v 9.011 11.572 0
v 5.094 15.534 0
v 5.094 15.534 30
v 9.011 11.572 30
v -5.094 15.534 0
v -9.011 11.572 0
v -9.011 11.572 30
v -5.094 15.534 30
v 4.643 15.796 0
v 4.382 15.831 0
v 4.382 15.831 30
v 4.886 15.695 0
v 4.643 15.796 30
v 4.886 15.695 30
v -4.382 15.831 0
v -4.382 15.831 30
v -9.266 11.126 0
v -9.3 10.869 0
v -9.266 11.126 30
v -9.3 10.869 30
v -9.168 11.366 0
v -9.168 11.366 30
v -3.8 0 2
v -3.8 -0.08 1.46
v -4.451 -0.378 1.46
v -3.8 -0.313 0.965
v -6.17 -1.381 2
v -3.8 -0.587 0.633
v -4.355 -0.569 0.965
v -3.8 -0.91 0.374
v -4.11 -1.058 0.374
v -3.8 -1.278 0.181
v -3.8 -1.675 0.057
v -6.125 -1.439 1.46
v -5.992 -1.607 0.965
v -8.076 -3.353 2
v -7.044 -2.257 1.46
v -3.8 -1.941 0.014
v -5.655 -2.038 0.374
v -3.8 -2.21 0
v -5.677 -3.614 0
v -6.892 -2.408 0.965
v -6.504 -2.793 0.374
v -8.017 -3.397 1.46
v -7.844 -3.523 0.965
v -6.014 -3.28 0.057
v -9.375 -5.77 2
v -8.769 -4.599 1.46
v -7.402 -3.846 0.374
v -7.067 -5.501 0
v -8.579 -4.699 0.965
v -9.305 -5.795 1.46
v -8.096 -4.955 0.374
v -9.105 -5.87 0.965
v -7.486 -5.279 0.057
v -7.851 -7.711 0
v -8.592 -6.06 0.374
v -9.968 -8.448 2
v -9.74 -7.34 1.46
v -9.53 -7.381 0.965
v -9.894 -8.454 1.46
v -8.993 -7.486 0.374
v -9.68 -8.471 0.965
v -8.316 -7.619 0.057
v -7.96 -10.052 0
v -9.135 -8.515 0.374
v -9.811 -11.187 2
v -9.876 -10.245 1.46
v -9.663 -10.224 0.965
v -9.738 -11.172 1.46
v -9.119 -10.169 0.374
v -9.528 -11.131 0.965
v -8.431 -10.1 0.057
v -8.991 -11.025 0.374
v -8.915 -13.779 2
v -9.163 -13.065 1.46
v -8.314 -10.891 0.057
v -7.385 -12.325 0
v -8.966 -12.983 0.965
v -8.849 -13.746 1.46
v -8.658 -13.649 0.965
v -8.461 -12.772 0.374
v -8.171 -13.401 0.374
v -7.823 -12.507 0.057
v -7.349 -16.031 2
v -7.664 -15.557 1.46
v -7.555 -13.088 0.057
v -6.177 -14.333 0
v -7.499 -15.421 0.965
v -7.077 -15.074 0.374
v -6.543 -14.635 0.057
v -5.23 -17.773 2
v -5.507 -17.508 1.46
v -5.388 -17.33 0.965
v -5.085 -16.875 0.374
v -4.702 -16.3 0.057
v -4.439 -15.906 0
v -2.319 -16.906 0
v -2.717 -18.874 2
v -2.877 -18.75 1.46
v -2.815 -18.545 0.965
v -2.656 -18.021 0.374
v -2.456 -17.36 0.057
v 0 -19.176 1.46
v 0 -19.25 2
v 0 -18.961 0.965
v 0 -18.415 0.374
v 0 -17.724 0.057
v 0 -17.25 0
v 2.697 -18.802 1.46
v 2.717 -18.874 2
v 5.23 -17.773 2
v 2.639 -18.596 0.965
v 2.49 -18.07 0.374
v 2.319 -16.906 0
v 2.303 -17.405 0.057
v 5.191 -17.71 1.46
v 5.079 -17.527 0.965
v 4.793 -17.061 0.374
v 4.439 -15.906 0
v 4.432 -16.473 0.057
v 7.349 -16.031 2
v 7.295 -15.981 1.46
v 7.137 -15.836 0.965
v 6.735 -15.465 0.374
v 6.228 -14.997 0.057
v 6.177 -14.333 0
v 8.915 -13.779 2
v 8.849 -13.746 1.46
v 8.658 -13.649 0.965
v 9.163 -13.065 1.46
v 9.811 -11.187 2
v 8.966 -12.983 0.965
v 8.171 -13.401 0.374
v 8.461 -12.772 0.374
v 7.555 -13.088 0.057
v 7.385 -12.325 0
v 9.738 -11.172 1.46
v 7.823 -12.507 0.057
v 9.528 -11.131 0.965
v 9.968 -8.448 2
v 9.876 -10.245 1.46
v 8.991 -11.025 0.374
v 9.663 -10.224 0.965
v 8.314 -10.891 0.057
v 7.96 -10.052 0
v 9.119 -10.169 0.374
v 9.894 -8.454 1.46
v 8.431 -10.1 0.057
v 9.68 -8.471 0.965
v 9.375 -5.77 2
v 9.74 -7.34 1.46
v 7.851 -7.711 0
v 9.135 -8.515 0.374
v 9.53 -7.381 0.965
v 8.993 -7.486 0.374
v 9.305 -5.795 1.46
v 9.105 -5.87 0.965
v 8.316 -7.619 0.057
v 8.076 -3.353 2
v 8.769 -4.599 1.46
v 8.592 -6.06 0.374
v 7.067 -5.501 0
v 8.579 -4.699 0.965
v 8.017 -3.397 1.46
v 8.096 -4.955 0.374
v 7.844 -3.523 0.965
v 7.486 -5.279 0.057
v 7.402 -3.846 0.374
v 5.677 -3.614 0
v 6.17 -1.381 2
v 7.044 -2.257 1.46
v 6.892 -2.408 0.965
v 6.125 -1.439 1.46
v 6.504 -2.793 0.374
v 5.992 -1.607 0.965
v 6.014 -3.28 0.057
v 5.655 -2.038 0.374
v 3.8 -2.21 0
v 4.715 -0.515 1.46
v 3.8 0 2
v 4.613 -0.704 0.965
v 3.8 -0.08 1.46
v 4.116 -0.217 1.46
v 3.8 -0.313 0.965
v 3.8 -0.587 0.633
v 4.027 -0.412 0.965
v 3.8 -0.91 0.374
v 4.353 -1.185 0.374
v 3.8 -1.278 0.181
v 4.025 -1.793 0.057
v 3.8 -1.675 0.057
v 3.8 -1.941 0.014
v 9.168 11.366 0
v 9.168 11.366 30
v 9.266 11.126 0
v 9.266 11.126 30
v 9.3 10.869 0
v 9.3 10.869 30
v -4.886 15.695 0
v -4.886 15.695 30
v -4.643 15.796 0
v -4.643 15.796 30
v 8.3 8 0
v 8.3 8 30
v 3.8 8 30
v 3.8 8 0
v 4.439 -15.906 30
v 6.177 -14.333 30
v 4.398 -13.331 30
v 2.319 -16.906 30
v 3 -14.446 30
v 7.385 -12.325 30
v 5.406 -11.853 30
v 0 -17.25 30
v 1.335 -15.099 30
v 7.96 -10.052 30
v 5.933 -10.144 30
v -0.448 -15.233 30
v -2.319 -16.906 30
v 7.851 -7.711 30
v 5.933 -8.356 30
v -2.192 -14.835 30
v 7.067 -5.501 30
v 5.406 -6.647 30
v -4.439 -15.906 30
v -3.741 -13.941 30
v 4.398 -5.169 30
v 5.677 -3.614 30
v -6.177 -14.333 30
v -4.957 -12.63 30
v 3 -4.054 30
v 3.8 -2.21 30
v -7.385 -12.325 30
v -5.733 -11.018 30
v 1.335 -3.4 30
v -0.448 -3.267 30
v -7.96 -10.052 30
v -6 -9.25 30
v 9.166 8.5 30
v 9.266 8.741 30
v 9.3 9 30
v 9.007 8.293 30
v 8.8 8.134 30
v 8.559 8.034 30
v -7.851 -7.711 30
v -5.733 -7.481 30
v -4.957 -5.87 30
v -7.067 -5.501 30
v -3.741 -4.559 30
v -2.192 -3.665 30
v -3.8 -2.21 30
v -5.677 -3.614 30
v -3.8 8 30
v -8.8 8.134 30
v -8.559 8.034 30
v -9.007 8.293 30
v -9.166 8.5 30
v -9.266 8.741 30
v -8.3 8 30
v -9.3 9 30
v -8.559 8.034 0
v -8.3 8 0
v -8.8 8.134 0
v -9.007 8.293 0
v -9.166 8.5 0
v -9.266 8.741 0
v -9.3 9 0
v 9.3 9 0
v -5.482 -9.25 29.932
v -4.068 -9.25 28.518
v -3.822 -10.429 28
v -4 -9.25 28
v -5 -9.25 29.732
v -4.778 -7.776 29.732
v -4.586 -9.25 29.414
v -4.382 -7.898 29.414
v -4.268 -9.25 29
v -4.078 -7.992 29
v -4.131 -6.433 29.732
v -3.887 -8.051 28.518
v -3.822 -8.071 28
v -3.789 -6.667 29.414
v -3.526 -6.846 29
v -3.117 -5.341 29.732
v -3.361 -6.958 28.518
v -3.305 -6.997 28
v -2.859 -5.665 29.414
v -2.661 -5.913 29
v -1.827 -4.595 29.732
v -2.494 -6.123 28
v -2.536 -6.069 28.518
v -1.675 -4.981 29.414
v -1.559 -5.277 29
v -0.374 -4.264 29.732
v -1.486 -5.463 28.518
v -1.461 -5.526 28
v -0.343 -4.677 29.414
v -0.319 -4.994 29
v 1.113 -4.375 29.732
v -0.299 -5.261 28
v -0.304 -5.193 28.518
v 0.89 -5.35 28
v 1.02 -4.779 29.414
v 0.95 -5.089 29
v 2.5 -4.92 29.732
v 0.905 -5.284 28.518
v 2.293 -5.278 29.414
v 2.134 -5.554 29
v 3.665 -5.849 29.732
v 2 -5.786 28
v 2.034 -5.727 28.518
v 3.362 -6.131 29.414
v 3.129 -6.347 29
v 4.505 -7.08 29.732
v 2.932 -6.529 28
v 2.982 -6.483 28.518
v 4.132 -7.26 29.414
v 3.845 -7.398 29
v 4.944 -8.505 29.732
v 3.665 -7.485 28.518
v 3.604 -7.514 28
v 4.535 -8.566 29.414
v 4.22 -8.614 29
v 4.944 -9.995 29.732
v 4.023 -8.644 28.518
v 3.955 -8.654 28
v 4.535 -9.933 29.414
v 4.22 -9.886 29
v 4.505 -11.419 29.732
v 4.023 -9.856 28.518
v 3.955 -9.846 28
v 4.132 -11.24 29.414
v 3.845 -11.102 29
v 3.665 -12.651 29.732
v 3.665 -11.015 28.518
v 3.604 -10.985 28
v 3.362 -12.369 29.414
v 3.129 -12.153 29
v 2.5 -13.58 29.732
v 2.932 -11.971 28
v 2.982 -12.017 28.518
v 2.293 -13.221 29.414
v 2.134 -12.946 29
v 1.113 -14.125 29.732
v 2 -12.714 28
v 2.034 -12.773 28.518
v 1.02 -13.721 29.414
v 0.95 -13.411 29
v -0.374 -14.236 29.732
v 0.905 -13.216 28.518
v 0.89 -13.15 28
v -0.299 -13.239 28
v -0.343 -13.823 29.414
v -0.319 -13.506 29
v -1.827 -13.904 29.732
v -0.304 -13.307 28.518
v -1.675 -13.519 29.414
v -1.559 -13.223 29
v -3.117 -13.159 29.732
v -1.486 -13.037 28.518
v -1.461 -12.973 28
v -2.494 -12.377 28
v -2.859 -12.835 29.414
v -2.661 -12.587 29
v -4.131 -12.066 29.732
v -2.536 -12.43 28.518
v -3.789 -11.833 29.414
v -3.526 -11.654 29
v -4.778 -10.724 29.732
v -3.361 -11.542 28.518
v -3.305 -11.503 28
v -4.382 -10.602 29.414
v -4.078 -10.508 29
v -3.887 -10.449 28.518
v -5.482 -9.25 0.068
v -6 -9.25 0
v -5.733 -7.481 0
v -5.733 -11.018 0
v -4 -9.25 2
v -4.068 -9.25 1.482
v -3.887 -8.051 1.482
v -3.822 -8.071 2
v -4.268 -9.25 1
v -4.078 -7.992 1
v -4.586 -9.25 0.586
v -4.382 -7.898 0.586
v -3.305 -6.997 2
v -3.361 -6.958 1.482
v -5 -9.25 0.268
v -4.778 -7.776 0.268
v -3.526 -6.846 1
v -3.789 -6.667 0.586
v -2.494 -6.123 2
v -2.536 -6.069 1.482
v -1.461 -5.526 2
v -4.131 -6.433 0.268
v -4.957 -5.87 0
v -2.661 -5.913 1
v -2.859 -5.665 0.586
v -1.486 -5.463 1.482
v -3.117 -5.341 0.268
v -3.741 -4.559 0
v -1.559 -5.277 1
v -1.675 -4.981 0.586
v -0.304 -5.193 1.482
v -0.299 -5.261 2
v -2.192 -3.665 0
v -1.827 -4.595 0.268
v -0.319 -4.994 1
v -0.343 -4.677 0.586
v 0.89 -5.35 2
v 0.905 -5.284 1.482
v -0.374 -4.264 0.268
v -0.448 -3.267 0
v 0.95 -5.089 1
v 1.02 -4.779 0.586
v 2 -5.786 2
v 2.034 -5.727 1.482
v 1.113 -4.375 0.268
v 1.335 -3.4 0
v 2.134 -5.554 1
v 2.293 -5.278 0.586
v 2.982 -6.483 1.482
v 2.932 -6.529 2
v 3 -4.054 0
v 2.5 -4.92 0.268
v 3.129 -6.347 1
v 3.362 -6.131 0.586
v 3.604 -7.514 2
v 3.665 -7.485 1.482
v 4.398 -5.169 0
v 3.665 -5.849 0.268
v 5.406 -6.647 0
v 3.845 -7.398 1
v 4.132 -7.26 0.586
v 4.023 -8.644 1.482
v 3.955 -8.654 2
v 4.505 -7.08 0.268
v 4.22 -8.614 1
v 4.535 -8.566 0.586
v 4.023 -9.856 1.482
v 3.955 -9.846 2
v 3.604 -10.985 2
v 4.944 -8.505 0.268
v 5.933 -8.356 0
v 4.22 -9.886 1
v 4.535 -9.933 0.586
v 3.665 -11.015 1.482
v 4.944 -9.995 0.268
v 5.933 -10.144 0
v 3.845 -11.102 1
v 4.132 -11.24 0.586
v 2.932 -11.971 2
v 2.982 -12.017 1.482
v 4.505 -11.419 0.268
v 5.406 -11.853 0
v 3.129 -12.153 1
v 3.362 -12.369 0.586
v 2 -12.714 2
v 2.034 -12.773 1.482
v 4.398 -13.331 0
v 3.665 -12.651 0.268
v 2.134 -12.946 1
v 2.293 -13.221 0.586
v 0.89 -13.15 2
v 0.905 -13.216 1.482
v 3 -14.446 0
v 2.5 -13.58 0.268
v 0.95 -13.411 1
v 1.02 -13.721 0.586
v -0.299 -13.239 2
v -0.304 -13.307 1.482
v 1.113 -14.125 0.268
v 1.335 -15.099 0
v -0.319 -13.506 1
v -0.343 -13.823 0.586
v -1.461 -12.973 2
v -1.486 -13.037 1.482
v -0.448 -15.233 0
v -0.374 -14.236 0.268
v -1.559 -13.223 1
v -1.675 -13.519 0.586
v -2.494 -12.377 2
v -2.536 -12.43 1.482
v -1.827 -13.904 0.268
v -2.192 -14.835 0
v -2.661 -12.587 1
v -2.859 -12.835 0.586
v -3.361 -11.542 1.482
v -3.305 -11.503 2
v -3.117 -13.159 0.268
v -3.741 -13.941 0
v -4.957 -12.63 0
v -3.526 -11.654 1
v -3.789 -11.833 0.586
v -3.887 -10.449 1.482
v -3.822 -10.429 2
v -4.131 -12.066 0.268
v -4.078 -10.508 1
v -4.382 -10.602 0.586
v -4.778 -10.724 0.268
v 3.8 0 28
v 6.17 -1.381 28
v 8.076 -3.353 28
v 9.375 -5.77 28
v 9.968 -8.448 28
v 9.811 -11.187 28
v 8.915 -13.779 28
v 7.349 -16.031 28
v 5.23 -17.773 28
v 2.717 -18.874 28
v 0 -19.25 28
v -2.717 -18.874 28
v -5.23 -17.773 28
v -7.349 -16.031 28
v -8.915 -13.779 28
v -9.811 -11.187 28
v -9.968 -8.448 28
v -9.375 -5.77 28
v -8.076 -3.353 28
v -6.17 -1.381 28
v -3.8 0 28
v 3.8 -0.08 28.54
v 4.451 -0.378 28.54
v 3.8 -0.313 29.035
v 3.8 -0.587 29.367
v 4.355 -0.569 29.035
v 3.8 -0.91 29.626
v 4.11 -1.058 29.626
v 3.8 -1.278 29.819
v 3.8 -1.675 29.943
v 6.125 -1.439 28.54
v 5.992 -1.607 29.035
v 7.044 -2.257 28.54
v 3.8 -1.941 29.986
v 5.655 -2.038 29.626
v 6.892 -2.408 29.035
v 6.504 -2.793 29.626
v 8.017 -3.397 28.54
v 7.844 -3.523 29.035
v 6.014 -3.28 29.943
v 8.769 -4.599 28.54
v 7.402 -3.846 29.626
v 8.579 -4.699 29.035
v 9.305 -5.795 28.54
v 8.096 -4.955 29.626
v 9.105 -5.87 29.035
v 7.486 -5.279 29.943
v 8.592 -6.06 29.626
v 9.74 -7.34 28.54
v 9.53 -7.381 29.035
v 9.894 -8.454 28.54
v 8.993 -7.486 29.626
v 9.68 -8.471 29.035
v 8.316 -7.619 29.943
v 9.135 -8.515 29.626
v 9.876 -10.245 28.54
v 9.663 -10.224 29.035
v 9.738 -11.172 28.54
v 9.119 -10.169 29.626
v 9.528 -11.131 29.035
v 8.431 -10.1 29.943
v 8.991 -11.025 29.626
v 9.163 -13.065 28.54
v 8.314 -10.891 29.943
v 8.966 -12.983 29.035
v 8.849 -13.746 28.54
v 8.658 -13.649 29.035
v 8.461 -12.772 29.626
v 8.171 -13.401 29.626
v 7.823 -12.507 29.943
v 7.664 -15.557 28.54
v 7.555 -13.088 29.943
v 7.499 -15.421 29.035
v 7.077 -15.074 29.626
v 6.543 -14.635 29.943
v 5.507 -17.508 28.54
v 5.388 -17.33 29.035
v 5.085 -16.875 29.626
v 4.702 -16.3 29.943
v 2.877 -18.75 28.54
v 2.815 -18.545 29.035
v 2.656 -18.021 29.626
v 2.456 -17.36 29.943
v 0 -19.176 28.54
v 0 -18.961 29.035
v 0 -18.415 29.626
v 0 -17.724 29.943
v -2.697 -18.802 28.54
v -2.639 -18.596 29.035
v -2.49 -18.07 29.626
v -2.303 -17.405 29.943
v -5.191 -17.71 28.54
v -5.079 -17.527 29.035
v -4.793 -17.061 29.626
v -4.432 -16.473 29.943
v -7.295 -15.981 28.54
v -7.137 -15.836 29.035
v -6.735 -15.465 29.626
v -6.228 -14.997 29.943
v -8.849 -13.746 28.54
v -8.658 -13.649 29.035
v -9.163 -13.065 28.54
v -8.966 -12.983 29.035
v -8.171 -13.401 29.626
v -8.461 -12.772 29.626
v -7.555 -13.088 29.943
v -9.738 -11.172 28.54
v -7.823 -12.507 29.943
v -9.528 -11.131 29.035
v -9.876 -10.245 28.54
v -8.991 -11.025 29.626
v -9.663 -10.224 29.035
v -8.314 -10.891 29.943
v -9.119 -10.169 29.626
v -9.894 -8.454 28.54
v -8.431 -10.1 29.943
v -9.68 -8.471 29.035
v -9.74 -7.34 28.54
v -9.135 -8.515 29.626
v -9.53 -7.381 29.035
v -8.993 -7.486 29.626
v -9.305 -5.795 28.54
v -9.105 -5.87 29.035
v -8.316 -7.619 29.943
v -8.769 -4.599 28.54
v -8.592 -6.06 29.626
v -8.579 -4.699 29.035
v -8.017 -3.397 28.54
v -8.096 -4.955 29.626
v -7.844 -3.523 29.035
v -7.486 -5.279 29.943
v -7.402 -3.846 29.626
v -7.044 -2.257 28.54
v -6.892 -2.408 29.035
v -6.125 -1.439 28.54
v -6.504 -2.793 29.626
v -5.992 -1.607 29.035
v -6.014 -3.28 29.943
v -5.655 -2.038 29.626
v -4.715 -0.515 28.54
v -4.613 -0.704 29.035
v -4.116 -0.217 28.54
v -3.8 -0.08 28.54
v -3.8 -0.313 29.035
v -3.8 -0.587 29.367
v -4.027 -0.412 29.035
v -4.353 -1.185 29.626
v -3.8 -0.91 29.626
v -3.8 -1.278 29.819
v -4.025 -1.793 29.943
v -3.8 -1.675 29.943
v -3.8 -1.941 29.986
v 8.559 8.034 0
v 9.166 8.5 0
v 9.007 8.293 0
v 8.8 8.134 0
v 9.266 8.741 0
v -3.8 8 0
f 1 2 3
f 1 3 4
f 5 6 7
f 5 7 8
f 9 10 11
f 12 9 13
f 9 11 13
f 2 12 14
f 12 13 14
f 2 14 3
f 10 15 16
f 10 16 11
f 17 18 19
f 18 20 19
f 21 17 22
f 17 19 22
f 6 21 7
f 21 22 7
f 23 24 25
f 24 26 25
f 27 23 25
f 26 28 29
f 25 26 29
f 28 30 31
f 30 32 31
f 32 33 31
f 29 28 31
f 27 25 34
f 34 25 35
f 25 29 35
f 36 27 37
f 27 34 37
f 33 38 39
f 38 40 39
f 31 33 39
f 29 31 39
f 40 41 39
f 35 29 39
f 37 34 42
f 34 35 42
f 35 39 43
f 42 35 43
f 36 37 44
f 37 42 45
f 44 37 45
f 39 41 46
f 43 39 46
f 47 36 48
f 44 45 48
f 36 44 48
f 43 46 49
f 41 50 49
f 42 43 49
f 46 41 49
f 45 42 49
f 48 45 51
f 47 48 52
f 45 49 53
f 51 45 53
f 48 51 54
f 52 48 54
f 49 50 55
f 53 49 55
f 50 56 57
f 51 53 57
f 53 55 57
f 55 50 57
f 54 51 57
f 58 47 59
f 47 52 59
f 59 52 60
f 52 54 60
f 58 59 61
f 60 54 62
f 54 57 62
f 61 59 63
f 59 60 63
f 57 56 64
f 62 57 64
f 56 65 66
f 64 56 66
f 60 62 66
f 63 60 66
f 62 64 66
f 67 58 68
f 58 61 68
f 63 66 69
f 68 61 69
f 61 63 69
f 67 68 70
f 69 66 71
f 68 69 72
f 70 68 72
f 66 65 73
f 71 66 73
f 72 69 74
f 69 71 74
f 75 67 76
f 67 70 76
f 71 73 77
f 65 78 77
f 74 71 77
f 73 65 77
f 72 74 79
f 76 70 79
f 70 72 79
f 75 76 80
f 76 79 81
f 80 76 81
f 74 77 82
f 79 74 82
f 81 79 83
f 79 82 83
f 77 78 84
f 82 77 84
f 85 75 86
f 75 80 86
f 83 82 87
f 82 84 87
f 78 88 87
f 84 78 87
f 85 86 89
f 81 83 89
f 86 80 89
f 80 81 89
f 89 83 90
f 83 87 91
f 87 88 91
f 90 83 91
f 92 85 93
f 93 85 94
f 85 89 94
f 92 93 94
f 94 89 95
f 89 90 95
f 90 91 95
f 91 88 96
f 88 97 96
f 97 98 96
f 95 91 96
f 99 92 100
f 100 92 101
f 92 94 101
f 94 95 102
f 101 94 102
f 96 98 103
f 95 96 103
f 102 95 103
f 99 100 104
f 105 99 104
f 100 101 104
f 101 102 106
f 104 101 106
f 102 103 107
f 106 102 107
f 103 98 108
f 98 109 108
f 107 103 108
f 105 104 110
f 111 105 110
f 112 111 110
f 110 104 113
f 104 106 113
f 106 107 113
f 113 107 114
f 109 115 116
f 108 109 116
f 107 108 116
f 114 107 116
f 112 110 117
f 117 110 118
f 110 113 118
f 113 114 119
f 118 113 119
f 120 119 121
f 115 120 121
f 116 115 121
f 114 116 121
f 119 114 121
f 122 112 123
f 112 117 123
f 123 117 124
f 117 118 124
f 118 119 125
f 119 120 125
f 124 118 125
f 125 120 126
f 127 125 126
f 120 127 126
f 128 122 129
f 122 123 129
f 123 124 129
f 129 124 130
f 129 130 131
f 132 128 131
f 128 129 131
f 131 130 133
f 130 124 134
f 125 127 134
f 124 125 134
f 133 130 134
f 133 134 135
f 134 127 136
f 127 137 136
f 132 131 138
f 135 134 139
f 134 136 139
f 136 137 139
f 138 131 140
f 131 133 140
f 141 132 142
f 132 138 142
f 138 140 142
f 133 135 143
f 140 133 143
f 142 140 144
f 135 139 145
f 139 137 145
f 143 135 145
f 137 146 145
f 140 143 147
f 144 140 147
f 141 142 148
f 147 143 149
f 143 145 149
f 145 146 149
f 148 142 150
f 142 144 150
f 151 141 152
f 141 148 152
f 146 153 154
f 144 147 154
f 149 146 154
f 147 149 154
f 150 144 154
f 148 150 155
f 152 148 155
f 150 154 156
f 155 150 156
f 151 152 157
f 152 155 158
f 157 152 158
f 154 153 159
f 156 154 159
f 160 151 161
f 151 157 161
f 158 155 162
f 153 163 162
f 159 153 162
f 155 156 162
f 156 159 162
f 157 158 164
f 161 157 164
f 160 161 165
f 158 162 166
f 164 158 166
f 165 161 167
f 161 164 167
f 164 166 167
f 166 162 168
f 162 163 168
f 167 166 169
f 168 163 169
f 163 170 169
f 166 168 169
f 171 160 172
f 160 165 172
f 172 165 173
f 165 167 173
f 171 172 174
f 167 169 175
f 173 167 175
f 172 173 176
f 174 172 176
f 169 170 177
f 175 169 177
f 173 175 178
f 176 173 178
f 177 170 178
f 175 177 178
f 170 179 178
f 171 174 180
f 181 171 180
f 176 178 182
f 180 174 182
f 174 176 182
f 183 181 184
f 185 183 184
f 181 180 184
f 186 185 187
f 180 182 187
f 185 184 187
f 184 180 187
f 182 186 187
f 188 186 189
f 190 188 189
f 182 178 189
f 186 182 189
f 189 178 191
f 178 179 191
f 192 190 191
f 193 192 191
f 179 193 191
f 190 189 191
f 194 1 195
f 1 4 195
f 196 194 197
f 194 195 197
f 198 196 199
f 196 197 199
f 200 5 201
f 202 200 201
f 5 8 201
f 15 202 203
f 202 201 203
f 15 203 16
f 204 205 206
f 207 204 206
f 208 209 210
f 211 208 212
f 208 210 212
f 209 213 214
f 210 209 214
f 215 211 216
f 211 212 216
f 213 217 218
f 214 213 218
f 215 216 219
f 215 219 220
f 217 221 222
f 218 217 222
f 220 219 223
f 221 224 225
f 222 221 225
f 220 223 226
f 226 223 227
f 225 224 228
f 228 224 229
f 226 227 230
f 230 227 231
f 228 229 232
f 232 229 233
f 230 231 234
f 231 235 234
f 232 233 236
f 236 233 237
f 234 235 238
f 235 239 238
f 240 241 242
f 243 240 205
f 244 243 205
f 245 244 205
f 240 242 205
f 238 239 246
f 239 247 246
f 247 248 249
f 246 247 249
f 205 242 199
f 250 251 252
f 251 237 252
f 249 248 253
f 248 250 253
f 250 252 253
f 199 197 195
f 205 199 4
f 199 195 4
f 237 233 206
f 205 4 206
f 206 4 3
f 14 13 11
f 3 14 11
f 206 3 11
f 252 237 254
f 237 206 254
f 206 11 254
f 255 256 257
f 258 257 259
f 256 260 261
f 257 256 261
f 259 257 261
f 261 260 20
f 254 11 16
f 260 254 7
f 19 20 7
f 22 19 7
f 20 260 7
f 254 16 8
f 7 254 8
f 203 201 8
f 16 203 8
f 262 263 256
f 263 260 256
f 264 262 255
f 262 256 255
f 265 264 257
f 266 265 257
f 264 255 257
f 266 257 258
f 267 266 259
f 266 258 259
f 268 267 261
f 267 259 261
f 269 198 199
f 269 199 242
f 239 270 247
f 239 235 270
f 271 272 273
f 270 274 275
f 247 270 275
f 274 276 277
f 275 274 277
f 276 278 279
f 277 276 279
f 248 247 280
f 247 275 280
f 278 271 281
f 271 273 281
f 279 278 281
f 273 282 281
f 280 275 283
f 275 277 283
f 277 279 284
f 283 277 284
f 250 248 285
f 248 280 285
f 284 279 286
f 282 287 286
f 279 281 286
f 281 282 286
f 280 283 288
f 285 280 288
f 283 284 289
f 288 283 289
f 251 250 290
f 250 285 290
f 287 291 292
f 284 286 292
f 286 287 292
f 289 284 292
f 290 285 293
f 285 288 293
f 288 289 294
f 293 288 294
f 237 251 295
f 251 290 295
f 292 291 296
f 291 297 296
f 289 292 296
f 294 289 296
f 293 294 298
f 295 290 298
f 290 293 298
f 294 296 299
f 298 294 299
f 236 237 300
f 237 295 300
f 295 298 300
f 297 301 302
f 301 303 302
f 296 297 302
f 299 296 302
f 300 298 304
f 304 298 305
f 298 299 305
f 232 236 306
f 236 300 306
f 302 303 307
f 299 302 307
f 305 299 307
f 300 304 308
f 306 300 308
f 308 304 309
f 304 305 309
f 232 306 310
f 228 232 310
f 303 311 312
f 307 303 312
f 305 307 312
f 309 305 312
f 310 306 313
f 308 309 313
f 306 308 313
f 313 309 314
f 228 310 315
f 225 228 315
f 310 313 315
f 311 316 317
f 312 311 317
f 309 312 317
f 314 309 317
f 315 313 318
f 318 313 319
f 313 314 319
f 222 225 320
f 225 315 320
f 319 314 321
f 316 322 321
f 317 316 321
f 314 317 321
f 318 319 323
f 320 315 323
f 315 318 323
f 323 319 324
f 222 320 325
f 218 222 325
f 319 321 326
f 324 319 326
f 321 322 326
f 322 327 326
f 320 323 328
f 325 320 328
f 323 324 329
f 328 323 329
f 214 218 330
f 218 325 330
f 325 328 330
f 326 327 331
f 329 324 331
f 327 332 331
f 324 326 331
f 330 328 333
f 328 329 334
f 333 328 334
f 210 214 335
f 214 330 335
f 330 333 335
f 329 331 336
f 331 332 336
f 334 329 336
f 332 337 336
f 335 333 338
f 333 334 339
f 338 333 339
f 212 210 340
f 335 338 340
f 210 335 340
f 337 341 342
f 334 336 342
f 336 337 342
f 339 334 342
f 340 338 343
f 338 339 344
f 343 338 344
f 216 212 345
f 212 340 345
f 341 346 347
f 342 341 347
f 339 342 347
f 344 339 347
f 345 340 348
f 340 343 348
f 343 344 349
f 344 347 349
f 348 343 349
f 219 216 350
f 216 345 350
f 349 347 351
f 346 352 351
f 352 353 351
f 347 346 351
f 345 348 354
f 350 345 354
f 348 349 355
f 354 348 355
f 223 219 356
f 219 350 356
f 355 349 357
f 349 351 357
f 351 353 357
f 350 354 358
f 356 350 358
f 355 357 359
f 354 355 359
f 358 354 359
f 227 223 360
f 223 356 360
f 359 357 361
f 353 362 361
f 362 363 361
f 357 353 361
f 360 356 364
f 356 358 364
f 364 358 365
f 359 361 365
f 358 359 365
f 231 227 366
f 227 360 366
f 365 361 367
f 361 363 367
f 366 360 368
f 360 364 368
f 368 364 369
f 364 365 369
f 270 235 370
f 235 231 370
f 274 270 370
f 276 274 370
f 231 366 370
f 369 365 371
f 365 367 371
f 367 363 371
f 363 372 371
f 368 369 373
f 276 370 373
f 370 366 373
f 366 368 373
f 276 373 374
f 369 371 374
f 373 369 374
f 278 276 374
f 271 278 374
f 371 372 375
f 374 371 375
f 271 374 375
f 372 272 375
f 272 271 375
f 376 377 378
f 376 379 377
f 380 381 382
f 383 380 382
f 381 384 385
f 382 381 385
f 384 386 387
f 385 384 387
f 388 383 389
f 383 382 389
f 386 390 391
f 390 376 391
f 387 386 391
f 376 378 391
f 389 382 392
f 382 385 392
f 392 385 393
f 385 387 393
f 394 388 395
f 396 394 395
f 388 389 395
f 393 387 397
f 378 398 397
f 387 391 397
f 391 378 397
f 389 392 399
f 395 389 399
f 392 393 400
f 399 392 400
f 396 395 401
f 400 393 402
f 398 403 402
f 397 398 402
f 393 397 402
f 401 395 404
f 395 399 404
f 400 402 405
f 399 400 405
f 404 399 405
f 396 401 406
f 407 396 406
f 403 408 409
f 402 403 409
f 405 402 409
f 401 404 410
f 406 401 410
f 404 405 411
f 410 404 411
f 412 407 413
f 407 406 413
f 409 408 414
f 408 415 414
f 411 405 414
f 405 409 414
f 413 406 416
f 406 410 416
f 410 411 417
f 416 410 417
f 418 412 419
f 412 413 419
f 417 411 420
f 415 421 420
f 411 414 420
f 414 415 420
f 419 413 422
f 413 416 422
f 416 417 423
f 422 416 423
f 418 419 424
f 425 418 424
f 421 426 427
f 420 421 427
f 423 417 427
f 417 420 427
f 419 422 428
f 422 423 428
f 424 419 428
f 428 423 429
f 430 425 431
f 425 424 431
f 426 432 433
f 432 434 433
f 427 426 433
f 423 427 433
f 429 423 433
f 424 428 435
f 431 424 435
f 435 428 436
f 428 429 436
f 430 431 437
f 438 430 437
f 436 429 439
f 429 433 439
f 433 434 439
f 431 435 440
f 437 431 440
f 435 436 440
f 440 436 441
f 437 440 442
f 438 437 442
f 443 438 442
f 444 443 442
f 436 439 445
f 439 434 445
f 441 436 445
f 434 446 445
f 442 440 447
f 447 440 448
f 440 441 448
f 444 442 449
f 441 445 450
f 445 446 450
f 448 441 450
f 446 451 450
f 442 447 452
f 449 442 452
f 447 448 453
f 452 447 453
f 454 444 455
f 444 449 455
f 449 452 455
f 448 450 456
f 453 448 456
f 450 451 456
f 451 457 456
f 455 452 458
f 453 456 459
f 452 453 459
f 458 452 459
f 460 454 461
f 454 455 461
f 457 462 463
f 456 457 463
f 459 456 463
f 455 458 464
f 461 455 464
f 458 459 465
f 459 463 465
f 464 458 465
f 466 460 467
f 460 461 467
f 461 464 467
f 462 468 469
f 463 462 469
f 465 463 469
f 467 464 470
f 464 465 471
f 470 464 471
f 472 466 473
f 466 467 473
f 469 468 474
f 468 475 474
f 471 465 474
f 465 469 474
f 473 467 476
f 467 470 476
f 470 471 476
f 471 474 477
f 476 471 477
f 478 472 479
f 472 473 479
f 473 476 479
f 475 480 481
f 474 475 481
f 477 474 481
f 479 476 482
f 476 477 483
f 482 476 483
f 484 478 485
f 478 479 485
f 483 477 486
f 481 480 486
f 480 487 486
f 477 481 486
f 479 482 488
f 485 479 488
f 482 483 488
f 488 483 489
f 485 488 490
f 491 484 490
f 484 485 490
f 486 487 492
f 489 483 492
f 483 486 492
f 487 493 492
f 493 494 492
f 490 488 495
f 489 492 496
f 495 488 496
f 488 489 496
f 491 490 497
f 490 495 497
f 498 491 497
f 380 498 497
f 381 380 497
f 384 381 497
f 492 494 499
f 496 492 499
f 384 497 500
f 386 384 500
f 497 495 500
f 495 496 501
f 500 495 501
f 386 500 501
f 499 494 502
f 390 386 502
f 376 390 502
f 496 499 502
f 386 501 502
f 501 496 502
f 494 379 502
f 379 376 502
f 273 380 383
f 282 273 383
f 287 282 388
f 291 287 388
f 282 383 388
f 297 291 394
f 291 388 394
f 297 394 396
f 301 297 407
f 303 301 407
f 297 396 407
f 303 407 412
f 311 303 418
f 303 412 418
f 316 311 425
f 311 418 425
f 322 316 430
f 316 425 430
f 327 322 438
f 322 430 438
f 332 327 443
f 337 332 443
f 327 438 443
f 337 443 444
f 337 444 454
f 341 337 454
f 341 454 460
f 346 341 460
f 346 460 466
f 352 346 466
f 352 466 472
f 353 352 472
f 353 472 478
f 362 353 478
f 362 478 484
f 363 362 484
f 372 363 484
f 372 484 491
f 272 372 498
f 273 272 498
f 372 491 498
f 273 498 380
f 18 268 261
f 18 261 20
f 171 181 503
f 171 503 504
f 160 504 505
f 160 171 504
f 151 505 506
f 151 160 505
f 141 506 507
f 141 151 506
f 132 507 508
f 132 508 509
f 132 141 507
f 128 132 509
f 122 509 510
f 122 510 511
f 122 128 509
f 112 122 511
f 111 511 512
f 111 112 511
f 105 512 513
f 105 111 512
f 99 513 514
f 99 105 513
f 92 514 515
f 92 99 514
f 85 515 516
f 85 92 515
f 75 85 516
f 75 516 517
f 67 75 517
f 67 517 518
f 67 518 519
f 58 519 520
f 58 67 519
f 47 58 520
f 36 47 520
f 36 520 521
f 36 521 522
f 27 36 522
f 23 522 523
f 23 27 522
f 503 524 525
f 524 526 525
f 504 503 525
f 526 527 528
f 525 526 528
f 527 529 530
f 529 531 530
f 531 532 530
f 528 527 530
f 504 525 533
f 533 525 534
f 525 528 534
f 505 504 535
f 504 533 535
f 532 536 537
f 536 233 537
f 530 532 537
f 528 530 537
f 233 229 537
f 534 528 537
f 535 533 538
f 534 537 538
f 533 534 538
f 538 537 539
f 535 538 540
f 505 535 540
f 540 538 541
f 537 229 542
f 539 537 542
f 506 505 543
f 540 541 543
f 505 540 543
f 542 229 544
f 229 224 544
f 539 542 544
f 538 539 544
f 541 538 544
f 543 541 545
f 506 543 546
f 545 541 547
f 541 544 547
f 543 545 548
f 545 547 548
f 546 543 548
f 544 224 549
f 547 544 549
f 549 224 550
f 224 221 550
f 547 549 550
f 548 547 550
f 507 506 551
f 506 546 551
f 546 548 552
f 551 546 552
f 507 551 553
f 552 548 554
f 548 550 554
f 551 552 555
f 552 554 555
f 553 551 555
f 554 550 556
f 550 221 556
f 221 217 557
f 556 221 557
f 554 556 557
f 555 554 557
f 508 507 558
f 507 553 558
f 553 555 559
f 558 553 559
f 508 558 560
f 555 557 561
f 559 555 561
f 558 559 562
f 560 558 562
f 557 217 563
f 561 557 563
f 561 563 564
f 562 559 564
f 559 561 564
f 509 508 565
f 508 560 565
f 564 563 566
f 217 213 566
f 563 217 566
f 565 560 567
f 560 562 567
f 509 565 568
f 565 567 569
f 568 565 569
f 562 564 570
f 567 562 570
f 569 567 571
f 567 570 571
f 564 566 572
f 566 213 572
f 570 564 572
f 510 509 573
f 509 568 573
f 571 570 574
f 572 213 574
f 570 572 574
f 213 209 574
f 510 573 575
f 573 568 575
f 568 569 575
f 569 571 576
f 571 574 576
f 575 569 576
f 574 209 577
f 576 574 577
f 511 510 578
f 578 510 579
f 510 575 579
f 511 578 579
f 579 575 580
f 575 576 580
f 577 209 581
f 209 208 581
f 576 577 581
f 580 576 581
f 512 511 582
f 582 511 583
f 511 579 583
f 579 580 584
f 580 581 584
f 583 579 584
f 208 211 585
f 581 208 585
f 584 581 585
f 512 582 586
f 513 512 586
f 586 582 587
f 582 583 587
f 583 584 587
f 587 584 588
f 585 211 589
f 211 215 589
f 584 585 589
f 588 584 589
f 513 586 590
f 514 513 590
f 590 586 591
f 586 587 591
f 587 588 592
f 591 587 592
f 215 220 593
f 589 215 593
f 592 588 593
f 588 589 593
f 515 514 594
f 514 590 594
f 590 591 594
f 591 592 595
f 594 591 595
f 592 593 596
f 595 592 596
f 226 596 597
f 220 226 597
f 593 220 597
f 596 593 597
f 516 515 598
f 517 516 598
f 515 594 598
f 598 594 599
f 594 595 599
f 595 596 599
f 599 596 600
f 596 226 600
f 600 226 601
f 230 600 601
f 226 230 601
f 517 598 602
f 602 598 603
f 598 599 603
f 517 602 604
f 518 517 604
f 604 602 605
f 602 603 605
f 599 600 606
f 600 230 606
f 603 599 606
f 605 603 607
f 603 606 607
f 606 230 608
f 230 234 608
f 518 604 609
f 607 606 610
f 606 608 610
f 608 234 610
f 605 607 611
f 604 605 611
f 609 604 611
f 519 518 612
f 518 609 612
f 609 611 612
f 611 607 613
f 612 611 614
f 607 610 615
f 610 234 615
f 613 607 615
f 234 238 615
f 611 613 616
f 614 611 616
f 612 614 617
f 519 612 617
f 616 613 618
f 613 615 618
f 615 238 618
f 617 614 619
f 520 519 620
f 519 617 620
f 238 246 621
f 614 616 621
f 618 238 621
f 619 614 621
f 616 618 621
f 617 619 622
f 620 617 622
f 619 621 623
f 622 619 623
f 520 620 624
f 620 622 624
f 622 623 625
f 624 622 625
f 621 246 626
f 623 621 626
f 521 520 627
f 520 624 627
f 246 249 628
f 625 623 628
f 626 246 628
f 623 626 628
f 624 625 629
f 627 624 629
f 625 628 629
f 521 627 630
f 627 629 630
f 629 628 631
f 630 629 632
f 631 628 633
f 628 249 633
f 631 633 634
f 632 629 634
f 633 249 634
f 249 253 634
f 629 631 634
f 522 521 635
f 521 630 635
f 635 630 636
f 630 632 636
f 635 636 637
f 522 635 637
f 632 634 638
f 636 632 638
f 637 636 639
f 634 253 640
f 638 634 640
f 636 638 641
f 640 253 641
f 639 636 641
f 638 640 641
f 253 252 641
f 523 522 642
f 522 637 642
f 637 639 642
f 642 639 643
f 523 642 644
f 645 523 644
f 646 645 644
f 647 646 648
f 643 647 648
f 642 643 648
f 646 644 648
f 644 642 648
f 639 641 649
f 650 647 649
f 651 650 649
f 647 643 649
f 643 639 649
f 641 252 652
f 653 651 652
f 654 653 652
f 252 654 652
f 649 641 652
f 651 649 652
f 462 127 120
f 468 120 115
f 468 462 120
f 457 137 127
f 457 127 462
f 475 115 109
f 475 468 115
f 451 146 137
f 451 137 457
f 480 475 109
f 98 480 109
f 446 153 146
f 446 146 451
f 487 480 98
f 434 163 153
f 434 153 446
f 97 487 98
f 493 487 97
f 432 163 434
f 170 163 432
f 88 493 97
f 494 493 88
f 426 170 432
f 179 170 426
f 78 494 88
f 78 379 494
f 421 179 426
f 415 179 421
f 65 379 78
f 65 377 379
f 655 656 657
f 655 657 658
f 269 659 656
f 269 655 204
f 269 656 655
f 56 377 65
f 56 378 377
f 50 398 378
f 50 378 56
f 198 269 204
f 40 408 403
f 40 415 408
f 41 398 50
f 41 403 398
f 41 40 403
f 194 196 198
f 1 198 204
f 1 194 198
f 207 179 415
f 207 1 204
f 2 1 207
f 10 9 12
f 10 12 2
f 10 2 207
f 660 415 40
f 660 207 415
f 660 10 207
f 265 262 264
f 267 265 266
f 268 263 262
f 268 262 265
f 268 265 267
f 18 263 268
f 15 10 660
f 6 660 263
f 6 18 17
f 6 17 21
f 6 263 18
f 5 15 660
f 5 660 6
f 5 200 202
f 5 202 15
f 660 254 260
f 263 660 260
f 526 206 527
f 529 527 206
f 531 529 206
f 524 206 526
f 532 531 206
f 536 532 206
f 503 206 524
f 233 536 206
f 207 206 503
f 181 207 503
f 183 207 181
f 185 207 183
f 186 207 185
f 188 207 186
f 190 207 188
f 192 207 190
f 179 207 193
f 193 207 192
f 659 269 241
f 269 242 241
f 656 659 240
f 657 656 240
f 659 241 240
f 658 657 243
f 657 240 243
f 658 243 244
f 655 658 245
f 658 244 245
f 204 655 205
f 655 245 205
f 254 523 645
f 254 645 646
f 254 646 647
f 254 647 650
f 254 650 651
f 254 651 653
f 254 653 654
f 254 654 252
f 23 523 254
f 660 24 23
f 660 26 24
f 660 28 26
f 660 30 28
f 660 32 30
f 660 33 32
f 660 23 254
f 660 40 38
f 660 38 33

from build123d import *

# Parameters (mm, degrees)
BOSS_EXTRUDE1_DEPTH = 30
FILLET1_R           = 1
SKETCH3_R           = 10
SKETCH3_R_2         = 4
BOSS_EXTRUDE2_DEPTH = 30
FILLET2_R           = 2


with BuildPart() as part:
    # Sketch1 → Boss-Extrude1 (new body)
    with BuildSketch(Plane.XY):
        Polygon((3.8, 0), (-3.8, 0), (-3.8, 8), (-9.3, 8), (-9.3, 11.28), (-4.8, 15.830824101), (4.8, 15.830824101), (9.3, 11.28), (9.3, 8), (3.8, 8), align=None)
    extrude(amount=BOSS_EXTRUDE1_DEPTH)

    # Fillet1
    fillet1_edges = [part.edges().sort_by_distance(p)[0] for p in [
        (9.3, 11.28, 15),
        (9.3, 8, 15),
        (-9.3, 8, 15),
        (-9.3, 11.28, 15),
        (-4.8, 15.830824101, 15),
        (4.8, 15.830824101, 15),
    ]]
    fillet(fillet1_edges, radius=FILLET1_R)

    # Sketch3 → Boss-Extrude2 (add)
    with BuildSketch(Plane(origin=(0, 0, 0), x_dir=(-1, 0, 0), z_dir=(0, 0, -1))):
        with Locations((0, -9.249864864)):
            Circle(SKETCH3_R)
        with Locations((0, -9.249864864)):
            Circle(SKETCH3_R_2, mode=Mode.SUBTRACT)
    extrude(amount=-BOSS_EXTRUDE2_DEPTH)

    # Fillet2
    fillet2_edges = [part.edges().sort_by_distance(p)[0] for p in [
        (0, -19.249864864, 0),
        (0, -19.249864864, 30),
        (4, -9.249864864, 30),
        (4, -9.249864864, 0),
    ]]
    fillet(fillet2_edges, radius=FILLET2_R)


solid = part.part
